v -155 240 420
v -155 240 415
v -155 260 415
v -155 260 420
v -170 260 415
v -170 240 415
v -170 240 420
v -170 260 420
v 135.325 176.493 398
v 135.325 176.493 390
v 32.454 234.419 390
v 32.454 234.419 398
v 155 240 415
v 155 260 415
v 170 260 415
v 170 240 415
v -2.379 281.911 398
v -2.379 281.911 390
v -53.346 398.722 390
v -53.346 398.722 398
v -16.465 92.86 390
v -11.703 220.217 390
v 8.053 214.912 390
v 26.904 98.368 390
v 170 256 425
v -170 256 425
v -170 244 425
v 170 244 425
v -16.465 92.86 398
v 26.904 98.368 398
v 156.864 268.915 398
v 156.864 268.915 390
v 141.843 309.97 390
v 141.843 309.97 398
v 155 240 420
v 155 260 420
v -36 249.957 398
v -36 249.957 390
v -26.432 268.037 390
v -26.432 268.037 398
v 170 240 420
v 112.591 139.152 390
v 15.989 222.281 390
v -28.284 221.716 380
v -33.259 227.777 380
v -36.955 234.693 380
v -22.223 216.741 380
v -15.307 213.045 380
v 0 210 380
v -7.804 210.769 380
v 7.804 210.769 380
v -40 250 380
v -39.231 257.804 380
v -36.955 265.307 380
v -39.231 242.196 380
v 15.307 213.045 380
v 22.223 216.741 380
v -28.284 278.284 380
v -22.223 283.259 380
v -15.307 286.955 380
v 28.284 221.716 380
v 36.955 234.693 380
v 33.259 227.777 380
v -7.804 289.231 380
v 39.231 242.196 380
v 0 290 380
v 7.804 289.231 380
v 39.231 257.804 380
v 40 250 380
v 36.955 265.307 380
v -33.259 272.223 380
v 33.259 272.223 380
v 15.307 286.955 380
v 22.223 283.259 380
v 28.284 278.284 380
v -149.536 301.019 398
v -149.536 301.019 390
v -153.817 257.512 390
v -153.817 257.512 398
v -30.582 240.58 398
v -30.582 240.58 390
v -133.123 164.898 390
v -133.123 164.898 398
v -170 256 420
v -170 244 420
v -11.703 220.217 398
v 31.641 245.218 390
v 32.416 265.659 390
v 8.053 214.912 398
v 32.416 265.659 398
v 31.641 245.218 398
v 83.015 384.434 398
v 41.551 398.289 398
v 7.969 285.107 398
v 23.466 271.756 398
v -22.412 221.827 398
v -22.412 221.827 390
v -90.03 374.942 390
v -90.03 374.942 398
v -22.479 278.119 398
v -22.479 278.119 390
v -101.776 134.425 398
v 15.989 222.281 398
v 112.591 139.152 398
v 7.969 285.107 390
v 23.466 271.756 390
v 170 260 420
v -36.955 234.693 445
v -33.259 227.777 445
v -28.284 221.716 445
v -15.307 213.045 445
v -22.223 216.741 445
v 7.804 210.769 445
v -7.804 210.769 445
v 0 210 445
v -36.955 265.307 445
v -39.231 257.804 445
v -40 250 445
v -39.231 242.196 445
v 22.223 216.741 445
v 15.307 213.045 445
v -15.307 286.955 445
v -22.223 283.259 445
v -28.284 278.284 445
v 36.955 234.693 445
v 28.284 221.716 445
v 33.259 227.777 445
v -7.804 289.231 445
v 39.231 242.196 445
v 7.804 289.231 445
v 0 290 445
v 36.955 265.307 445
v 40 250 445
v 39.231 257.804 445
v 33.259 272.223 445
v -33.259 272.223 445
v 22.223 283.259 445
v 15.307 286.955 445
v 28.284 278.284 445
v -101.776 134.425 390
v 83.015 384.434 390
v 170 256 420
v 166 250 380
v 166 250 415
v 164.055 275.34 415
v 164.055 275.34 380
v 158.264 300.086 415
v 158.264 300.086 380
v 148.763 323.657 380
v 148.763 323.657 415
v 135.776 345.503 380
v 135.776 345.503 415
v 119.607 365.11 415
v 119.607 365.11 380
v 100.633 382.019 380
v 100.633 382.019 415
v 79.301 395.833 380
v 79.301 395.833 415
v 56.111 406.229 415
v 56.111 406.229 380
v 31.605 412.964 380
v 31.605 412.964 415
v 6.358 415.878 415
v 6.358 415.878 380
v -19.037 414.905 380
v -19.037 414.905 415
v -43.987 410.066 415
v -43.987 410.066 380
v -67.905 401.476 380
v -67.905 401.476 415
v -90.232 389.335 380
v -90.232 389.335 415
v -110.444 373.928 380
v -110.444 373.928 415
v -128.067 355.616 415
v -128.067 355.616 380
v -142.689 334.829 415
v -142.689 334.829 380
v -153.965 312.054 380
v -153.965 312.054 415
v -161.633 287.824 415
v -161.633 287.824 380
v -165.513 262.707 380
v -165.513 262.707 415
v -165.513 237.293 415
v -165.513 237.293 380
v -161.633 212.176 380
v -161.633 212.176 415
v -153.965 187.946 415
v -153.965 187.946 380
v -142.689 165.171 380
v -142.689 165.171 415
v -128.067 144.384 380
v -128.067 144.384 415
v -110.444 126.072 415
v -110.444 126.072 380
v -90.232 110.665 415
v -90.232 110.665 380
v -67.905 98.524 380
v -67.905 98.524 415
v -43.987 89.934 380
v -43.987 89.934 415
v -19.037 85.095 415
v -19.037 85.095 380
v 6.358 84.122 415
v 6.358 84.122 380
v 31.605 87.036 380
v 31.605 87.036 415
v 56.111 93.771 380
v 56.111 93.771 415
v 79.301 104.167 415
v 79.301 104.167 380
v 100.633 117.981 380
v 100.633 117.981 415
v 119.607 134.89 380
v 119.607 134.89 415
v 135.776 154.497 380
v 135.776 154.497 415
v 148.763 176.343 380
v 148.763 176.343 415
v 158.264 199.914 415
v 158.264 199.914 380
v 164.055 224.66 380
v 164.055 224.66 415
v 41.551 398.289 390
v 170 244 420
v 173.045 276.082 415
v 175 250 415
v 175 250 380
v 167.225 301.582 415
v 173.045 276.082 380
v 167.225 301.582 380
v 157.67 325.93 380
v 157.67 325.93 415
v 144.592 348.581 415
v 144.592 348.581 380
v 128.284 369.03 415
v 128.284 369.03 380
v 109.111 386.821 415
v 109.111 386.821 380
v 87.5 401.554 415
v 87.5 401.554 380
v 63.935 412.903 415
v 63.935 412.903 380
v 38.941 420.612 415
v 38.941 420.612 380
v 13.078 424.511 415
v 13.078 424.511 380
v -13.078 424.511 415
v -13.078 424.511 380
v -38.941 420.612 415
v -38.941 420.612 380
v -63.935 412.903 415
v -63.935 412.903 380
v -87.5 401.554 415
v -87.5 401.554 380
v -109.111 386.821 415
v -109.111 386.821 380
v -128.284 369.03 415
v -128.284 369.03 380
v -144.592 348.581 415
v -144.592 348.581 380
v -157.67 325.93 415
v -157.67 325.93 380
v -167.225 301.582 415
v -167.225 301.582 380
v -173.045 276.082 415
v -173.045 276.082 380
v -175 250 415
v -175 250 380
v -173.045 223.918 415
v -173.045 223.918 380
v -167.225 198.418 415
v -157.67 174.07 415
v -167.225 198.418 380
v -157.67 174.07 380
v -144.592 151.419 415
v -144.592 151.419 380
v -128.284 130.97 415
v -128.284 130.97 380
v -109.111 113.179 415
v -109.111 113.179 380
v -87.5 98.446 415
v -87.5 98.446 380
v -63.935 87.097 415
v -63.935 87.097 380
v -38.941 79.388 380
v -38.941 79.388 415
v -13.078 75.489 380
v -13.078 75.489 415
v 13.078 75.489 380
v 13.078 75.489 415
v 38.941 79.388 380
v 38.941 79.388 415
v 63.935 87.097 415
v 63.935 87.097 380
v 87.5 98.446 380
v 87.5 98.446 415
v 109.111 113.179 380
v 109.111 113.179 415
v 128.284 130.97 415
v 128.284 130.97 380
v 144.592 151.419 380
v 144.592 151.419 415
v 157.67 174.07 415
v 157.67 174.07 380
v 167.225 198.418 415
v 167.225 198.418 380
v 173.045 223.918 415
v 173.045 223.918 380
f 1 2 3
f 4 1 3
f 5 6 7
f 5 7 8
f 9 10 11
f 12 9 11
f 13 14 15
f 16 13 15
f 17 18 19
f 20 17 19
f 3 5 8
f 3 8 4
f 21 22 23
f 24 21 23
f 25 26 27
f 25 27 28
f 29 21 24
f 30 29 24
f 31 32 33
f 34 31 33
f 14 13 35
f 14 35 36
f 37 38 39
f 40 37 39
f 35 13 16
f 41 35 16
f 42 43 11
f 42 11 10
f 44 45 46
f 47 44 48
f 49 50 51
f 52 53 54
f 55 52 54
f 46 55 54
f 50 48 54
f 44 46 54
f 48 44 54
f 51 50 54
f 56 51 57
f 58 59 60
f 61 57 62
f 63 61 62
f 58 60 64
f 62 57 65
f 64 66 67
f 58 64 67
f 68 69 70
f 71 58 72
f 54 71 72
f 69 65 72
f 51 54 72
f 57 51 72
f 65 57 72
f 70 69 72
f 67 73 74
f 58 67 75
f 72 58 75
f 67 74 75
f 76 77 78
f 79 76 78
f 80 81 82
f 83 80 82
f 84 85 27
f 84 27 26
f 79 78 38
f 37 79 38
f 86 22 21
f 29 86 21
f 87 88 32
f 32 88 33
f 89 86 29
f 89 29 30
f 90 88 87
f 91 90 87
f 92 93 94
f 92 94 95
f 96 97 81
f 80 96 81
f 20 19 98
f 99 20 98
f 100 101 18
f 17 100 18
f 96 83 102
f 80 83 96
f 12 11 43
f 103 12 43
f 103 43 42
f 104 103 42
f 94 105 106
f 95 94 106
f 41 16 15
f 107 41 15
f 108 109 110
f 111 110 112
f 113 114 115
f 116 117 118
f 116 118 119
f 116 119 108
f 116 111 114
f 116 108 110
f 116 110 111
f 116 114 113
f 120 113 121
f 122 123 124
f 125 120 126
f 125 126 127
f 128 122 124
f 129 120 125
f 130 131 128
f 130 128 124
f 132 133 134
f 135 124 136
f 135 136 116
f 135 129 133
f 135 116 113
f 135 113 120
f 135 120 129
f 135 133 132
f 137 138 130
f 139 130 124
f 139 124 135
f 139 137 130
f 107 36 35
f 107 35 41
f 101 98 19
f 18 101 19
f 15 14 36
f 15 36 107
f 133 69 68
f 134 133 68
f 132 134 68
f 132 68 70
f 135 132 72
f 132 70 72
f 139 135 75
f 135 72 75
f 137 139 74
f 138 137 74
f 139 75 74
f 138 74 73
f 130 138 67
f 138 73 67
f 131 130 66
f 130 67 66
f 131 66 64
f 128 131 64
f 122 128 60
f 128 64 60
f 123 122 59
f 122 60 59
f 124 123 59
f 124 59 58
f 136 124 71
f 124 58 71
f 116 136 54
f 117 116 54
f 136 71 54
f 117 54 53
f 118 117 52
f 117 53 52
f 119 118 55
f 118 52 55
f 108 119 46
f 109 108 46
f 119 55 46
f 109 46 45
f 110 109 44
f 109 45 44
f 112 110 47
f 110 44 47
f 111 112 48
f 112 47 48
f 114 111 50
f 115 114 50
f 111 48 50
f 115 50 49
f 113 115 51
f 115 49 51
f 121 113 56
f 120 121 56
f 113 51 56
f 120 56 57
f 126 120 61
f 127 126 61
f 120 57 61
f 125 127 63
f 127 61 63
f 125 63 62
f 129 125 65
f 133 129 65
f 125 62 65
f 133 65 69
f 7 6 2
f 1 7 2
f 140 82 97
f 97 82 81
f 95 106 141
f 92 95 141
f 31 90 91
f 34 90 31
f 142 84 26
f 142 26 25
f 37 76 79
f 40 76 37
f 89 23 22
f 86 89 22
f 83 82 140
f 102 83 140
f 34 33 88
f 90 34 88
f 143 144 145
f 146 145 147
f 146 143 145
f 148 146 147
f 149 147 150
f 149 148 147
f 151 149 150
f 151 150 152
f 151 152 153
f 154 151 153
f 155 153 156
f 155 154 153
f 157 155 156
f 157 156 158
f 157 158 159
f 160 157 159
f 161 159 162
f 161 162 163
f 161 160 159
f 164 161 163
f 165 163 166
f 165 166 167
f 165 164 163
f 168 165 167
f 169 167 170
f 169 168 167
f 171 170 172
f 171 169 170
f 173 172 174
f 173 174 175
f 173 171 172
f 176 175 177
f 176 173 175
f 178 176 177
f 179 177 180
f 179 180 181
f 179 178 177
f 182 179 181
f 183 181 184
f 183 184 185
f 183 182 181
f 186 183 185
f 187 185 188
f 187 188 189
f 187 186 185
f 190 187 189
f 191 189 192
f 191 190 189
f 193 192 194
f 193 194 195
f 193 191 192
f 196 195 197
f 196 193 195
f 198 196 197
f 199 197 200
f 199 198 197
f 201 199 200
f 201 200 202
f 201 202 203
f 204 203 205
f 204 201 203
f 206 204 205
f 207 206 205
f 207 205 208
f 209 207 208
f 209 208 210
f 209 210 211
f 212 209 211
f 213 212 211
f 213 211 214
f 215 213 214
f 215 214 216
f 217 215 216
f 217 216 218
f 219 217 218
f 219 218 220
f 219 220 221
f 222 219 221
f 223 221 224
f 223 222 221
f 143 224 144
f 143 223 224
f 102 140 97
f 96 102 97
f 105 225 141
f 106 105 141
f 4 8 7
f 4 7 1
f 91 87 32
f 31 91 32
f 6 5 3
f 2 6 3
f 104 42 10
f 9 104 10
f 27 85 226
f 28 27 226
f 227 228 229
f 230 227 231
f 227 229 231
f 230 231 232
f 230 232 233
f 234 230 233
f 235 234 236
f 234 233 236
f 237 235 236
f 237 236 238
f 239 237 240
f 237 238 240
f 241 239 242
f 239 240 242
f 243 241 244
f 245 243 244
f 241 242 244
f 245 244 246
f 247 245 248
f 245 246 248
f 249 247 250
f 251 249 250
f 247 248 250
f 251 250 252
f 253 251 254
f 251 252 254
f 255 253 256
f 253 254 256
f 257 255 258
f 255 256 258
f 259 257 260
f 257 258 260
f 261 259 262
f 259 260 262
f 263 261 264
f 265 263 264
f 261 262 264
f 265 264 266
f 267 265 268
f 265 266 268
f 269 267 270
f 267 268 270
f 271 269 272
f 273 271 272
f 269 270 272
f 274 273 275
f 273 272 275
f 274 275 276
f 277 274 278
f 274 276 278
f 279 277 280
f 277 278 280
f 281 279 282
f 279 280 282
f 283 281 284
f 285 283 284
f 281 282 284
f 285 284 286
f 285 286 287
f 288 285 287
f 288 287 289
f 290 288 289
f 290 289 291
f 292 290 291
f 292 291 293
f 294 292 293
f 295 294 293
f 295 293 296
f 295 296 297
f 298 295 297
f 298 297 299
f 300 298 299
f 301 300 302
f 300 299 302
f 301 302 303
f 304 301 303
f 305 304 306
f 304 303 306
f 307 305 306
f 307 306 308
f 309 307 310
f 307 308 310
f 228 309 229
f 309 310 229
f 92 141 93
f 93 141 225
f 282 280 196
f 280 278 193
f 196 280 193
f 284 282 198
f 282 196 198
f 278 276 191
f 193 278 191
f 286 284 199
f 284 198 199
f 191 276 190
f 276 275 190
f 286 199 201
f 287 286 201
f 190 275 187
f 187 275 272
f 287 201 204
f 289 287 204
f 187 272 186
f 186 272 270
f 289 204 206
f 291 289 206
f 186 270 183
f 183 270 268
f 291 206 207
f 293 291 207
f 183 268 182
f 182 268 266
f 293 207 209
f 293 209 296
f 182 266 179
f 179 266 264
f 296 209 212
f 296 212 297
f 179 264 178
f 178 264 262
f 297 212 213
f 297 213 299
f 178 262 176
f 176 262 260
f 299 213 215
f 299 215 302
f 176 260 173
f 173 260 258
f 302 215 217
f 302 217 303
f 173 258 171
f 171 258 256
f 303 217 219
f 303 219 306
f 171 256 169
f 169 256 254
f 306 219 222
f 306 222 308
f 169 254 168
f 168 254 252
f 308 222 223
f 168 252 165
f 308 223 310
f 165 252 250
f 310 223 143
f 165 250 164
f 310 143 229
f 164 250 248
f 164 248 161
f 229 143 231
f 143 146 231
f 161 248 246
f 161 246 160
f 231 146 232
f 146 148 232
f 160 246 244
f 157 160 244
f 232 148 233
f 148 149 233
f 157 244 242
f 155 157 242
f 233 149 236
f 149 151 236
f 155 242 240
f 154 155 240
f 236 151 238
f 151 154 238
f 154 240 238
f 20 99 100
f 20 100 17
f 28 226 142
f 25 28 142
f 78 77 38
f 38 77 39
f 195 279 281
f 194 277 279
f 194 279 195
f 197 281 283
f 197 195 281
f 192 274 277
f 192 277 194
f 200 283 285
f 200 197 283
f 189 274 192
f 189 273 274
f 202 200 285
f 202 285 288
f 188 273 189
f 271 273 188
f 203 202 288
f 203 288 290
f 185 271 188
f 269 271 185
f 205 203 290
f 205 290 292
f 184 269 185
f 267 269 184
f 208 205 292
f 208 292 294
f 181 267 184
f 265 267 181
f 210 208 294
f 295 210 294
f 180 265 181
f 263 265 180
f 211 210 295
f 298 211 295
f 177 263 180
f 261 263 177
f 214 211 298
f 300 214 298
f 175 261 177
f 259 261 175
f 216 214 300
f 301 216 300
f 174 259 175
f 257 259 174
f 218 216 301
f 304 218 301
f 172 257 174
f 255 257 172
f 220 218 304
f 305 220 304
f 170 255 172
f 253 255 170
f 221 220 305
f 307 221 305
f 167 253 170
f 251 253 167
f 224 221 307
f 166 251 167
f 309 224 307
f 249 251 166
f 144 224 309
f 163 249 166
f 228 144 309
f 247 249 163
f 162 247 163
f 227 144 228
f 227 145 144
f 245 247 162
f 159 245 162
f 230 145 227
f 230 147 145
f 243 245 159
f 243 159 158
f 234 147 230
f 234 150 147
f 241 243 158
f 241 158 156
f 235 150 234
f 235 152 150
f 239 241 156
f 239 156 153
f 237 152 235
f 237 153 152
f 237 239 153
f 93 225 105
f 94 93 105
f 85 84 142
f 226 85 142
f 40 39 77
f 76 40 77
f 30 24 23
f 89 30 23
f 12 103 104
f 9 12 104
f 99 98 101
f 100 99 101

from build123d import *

# Parameters (mm, degrees)
FAN_HOUSING_OD350_ASSUMED_START  = 380
SKETCH1_R                        = 175
SKETCH1_R_2                      = 166
FAN_HOUSING_OD350_ASSUMED_DEPTH  = 35
FAN_MOTOR_ENVELOPE_ASSUMED_START = 380
SKETCH2_R                        = 40
FAN_MOTOR_ENVELOPE_ASSUMED_DEPTH = 65
BLADE_1_VISUAL_ONLY_START        = 390
BLADE_1_VISUAL_ONLY_DEPTH        = 8
BLADE_2_VISUAL_ONLY_START        = 390
BLADE_2_VISUAL_ONLY_DEPTH        = 8
BLADE_3_VISUAL_ONLY_START        = 390
BLADE_3_VISUAL_ONLY_DEPTH        = 8
BLADE_4_VISUAL_ONLY_START        = 390
BLADE_4_VISUAL_ONLY_DEPTH        = 8
BLADE_5_VISUAL_ONLY_START        = 390
BLADE_5_VISUAL_ONLY_DEPTH        = 8
BLADE_6_VISUAL_ONLY_START        = 390
BLADE_6_VISUAL_ONLY_DEPTH        = 8
BLADE_7_VISUAL_ONLY_START        = 390
BLADE_7_VISUAL_ONLY_DEPTH        = 8
MOTOR_SUPPORT_STRUT_START        = 415
SKETCH10_W                       = 15
SKETCH10_H                       = 20
MOTOR_SUPPORT_STRUT_DEPTH        = 5
BOSS_EXTRUDE11_START             = 415
SKETCH11_W                       = 15
SKETCH11_H                       = 20
BOSS_EXTRUDE11_DEPTH             = 5
MOTOR_SUPPORT_BRIDGE_START       = 420
SKETCH12_W                       = 340
SKETCH12_H                       = 12
MOTOR_SUPPORT_BRIDGE_DEPTH       = 5


with BuildPart() as part:
    # Sketch1 → Fan_housing_OD350_ASSUMED (new body)
    with BuildSketch(Plane.XY.offset(FAN_HOUSING_OD350_ASSUMED_START)):
        with Locations((0, 250)):
            Circle(SKETCH1_R)
        with Locations((0, 250)):
            Circle(SKETCH1_R_2, mode=Mode.SUBTRACT)
    extrude(amount=FAN_HOUSING_OD350_ASSUMED_DEPTH)


with BuildPart() as body_2:
    # Sketch2 → Fan_motor_envelope_ASSUMED (new body)
    with BuildSketch(Plane.XY.offset(FAN_MOTOR_ENVELOPE_ASSUMED_START)):
        with Locations((0, 250)):
            Circle(SKETCH2_R)
    extrude(amount=FAN_MOTOR_ENVELOPE_ASSUMED_DEPTH)


with BuildPart() as body_3:
    # Sketch3 → Blade_1_VISUAL_ONLY (new body)
    with BuildSketch(Plane.XY.offset(BLADE_1_VISUAL_ONLY_START)):
        Polygon((31.640674494, 245.217979761), (156.863764465, 268.914528752), (141.843393076, 309.970424716), (32.416095685, 265.658759228), align=None)
    extrude(amount=BLADE_1_VISUAL_ONLY_DEPTH)


with BuildPart() as body_4:
    # Sketch4 → Blade_2_VISUAL_ONLY (new body)
    with BuildSketch(Plane.XY.offset(BLADE_2_VISUAL_ONLY_START)):
        Polygon((23.466371844, 271.756134595), (83.014983371, 384.434045301), (41.551142985, 398.288578511), (7.968594135, 285.107000833), align=None)
    extrude(amount=BLADE_2_VISUAL_ONLY_DEPTH)


with BuildPart() as body_5:
    # Sketch5 → Blade_3_VISUAL_ONLY (new body)
    with BuildSketch(Plane.XY.offset(BLADE_3_VISUAL_ONLY_START)):
        Polygon((-2.378587432, 281.911476334), (-53.345773398, 398.721983784), (-90.029965263, 374.942408151), (-22.479421328, 278.118954759), align=None)
    extrude(amount=BLADE_3_VISUAL_ONLY_DEPTH)


with BuildPart() as body_6:
    # Sketch6 → Blade_4_VISUAL_ONLY (new body)
    with BuildSketch(Plane.XY.offset(BLADE_4_VISUAL_ONLY_START)):
        Polygon((-26.432421857, 268.036825519), (-149.536074743, 301.019235102), (-153.816673392, 257.512056094), (-35.999974035, 249.956762229), align=None)
    extrude(amount=BLADE_4_VISUAL_ONLY_DEPTH)


with BuildPart() as body_7:
    # Sketch7 → Blade_5_VISUAL_ONLY (new body)
    with BuildSketch(Plane.XY.offset(BLADE_5_VISUAL_ONLY_START)):
        Polygon((-30.5821035, 240.580077204), (-133.122661826, 164.897961786), (-101.776289167, 134.424972579), (-22.411812027, 221.827128622), align=None)
    extrude(amount=BLADE_5_VISUAL_ONLY_DEPTH)


with BuildPart() as body_8:
    # Sketch8 → Blade_6_VISUAL_ONLY (new body)
    with BuildSketch(Plane.XY.offset(BLADE_6_VISUAL_ONLY_START)):
        Polygon((-11.702837447, 220.216722885), (-16.465169347, 92.86025901), (26.903716658, 98.368242014), (8.052901555, 214.912241785), align=None)
    extrude(amount=BLADE_6_VISUAL_ONLY_DEPTH)


with BuildPart() as body_9:
    # Sketch9 → Blade_7_VISUAL_ONLY (new body)
    with BuildSketch(Plane.XY.offset(BLADE_7_VISUAL_ONLY_START)):
        Polygon((15.988903898, 222.280783703), (112.590931479, 139.151986266), (135.324675104, 176.493317936), (32.453616016, 234.419152543), align=None)
    extrude(amount=BLADE_7_VISUAL_ONLY_DEPTH)


with BuildPart() as body_10:
    # Sketch10 → Motor_support_strut (new body)
    with BuildSketch(Plane.XY.offset(MOTOR_SUPPORT_STRUT_START)):
        with Locations((-162.5, 250)):
            Rectangle(SKETCH10_W, SKETCH10_H)
    extrude(amount=MOTOR_SUPPORT_STRUT_DEPTH)


with BuildPart() as body_11:
    # Sketch11 → Boss-Extrude11 (new body)
    with BuildSketch(Plane.XY.offset(BOSS_EXTRUDE11_START)):
        with Locations((162.5, 250)):
            Rectangle(SKETCH11_W, SKETCH11_H)
    extrude(amount=BOSS_EXTRUDE11_DEPTH)


with BuildPart() as body_12:
    # Sketch12 → Motor_support_bridge (new body)
    with BuildSketch(Plane.XY.offset(MOTOR_SUPPORT_BRIDGE_START)):
        with Locations((0, 250)):
            Rectangle(SKETCH12_W, SKETCH12_H)
    extrude(amount=MOTOR_SUPPORT_BRIDGE_DEPTH)


solid = Compound([part.part, body_2.part, body_3.part, body_4.part, body_5.part, body_6.part, body_7.part, body_8.part, body_9.part, body_10.part, body_11.part, body_12.part])
